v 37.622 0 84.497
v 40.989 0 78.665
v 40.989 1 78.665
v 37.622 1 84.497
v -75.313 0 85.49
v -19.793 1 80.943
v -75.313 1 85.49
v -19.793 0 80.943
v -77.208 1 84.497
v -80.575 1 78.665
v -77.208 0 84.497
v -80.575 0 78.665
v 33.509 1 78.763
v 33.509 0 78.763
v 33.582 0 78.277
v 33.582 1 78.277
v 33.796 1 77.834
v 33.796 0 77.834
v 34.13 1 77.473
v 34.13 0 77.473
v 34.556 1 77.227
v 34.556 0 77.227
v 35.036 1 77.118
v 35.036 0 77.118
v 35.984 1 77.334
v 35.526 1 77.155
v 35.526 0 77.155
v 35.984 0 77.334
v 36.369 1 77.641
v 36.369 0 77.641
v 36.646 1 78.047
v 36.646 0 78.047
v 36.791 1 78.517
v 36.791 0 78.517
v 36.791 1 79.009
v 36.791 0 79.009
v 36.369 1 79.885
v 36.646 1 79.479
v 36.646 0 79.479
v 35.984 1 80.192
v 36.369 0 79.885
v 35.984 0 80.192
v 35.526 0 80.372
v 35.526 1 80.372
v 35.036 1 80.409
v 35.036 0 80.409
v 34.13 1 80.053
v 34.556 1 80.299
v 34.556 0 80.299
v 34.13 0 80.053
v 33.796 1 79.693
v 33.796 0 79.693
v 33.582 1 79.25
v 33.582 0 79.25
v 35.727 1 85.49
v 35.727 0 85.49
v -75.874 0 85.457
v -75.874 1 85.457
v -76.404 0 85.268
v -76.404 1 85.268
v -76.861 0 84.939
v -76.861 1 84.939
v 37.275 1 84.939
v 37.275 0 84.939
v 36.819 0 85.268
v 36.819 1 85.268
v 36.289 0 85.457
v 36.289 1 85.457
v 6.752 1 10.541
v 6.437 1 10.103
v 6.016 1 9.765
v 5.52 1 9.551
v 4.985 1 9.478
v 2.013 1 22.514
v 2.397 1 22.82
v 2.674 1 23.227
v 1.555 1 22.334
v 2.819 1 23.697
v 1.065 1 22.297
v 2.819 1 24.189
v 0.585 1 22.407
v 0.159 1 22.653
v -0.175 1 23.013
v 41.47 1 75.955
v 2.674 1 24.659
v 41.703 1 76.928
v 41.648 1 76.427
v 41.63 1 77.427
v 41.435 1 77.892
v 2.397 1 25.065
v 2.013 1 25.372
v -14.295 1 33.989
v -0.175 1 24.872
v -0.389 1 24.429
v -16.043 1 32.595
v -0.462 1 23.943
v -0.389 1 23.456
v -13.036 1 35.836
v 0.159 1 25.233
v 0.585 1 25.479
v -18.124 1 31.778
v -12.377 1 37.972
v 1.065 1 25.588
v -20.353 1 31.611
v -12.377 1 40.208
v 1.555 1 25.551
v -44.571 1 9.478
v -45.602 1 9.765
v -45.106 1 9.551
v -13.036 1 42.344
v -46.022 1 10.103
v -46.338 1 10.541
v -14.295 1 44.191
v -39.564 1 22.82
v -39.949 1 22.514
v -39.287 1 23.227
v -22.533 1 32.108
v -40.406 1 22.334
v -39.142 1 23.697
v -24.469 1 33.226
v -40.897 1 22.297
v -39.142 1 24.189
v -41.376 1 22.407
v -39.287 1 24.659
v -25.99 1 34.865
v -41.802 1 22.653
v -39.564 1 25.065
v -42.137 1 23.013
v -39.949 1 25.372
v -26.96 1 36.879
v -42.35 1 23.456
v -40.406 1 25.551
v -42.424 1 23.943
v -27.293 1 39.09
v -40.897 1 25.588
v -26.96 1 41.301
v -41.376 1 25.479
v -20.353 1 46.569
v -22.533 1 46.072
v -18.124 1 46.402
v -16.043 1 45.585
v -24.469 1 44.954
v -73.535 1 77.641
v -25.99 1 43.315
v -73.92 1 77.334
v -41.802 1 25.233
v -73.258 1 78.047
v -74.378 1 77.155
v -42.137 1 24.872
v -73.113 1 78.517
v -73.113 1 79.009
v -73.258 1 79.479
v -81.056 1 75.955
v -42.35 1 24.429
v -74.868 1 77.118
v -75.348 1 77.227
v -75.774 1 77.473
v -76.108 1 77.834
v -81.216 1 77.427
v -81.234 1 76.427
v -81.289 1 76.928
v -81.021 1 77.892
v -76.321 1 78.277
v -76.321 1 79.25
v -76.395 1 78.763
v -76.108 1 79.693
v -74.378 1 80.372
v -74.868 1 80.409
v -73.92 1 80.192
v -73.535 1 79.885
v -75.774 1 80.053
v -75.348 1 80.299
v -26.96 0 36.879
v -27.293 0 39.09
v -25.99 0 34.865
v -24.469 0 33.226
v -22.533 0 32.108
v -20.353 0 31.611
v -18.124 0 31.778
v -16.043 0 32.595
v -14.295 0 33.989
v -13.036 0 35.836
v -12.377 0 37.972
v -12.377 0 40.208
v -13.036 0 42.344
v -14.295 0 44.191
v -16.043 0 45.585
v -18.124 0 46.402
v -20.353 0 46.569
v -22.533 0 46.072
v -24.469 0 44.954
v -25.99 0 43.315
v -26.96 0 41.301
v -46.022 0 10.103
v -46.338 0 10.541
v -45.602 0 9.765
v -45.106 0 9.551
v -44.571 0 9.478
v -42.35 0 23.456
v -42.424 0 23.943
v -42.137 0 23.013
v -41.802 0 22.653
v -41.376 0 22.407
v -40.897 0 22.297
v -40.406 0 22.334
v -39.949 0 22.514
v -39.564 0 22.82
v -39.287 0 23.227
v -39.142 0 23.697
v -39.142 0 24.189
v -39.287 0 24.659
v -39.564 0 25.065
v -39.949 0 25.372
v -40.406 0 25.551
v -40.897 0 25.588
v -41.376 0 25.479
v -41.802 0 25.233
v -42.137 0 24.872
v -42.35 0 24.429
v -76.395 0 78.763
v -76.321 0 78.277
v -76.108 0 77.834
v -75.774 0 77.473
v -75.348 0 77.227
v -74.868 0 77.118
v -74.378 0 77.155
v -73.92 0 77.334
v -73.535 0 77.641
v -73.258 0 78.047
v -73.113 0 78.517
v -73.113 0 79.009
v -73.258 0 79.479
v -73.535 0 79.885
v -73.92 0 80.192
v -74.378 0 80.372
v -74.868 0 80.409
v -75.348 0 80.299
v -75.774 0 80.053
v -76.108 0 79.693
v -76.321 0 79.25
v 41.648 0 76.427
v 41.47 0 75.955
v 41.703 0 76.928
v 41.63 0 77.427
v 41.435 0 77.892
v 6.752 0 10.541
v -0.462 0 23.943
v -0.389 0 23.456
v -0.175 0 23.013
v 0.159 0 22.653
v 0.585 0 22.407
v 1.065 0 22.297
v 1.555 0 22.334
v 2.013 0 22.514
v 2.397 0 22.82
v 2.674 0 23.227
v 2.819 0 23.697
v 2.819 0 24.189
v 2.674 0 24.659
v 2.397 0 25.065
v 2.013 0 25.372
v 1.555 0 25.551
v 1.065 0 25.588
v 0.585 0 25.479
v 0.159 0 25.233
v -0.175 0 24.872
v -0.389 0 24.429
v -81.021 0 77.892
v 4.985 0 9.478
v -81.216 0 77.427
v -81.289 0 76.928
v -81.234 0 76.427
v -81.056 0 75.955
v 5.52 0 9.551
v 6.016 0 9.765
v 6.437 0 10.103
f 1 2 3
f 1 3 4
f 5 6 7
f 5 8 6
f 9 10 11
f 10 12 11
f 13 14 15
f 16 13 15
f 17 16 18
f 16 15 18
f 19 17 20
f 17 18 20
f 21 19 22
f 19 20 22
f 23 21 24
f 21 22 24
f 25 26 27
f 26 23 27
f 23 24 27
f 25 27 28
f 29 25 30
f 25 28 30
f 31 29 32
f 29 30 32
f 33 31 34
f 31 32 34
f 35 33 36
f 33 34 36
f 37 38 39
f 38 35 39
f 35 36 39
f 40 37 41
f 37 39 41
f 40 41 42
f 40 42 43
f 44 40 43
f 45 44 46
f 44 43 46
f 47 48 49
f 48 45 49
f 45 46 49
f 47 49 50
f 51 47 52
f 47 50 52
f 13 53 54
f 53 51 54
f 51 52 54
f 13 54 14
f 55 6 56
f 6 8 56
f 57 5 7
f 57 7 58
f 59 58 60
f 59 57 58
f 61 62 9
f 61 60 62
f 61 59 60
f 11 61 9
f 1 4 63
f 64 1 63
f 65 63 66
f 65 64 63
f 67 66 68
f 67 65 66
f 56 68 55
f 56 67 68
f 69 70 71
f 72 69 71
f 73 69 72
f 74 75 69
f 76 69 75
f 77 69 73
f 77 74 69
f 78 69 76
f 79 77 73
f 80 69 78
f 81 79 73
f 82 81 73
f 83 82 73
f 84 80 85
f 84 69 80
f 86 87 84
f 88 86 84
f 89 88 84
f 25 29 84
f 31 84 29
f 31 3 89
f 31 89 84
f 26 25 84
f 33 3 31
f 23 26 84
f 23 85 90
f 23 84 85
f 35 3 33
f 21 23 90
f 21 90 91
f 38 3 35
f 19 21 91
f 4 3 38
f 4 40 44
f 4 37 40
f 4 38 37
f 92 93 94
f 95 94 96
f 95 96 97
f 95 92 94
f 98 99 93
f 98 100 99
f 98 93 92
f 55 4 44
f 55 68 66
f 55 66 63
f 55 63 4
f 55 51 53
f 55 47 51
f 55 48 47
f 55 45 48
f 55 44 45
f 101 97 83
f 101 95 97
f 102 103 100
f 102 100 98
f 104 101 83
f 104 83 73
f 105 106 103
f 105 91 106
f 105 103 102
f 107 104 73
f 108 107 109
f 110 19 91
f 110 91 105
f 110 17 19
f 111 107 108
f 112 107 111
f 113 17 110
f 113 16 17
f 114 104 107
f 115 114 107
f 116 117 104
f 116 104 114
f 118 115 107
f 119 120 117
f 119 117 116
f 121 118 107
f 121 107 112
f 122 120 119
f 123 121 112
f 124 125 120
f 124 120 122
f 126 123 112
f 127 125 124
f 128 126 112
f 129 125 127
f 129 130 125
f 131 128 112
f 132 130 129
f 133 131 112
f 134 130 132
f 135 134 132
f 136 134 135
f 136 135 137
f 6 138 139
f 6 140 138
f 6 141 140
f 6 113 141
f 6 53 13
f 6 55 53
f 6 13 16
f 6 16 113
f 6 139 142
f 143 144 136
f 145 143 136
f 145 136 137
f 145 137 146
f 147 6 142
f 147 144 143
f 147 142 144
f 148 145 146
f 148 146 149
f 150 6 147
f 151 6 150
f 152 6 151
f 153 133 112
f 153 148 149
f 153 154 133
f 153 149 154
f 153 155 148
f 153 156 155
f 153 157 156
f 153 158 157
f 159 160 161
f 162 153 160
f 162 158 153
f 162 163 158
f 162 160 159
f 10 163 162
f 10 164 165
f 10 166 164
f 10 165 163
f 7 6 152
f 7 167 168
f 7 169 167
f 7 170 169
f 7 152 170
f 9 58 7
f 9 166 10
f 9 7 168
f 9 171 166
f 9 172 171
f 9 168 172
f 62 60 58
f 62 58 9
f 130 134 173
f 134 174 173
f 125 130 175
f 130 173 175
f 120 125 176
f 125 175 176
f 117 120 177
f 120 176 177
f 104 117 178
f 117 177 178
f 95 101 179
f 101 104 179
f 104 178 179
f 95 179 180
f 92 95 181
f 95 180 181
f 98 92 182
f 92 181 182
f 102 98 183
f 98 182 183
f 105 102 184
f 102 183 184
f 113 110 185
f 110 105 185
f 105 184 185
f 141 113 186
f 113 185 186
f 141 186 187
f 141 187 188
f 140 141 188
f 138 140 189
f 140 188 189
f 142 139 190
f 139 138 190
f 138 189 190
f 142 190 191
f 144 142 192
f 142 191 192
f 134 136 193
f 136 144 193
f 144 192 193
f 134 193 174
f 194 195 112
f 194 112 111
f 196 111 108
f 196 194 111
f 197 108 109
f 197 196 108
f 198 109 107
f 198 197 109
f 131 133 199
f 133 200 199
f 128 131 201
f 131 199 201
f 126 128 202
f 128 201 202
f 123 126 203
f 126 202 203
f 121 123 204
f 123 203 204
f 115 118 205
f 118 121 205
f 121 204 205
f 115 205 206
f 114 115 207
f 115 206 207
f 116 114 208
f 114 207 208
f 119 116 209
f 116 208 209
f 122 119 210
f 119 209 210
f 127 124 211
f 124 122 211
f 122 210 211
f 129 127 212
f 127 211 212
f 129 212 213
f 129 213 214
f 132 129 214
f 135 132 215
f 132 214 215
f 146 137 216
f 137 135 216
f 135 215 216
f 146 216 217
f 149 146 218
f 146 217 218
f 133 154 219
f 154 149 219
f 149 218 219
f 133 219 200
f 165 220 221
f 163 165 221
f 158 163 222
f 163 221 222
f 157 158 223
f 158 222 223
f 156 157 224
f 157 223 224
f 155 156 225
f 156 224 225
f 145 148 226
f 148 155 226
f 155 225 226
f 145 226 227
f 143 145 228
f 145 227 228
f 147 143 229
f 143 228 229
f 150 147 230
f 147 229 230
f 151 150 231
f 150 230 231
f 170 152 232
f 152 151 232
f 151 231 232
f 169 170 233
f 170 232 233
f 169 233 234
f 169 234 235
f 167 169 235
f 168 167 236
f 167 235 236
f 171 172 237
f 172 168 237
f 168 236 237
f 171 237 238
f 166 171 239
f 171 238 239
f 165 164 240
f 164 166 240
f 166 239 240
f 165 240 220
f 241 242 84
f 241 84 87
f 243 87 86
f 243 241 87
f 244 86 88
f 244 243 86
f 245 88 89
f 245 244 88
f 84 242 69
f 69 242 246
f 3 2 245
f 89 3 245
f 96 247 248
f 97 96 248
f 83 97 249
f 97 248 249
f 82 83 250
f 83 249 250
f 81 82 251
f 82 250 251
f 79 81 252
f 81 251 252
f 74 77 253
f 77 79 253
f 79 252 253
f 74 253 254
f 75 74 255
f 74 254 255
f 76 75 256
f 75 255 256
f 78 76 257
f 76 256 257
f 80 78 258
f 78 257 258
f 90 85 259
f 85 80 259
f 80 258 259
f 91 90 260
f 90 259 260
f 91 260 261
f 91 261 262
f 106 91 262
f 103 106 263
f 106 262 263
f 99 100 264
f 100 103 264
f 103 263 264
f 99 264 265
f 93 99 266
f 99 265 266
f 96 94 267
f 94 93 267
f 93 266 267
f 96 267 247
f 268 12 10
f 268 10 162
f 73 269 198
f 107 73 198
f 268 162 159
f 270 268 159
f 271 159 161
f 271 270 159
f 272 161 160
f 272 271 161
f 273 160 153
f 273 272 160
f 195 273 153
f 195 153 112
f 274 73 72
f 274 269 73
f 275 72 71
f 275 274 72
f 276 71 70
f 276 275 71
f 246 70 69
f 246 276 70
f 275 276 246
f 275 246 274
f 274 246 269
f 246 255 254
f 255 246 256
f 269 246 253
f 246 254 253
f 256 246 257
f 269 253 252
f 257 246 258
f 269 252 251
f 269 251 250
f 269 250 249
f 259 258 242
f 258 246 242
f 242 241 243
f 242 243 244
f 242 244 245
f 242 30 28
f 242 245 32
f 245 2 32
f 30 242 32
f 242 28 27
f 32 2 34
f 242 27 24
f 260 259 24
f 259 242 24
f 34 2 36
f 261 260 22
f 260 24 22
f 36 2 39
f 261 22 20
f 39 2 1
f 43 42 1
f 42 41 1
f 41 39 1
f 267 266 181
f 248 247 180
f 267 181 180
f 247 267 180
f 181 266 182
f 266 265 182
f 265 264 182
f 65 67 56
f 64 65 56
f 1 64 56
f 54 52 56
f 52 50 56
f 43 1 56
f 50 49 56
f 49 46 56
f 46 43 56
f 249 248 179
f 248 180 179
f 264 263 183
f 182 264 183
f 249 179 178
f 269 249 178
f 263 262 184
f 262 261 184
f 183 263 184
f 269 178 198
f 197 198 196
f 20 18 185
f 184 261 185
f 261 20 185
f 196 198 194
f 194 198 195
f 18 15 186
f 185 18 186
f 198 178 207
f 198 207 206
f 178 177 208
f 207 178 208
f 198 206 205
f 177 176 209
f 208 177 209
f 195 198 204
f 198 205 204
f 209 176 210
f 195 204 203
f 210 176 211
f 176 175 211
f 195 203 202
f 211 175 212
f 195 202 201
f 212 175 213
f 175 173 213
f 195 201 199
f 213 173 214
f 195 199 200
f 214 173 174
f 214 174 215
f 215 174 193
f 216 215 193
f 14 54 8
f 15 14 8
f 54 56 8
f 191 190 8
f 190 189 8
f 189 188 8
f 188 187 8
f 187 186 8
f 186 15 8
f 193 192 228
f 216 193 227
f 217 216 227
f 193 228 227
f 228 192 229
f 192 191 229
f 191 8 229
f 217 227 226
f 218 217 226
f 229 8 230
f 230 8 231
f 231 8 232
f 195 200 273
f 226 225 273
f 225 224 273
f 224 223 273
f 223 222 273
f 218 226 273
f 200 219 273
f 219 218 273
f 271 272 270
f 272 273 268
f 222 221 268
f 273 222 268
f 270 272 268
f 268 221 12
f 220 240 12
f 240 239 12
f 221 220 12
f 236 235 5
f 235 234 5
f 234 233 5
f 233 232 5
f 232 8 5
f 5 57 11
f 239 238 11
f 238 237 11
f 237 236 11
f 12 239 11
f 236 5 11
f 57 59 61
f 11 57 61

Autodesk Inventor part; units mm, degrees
ref_plane "YZ Plane" through (0, 0, 0) normal (1, 0, 0) x (0, 1, 0)
ref_plane "XZ Plane" through (0, 0, 0) normal (0, 1, 0) x (-1, 0, 0)
ref_plane "XY Plane" through (0, 0, 0) normal (0, 0, 1) x (1, 0, 0)
sketch "Sketch1" plane through (0, 0, 0) normal (0, 1, 0) x (-1, 0, 0)
  line L0 (80.5749, 78.6651) -> (77.2081, 84.4966)
  line L1 (-40.9892, 78.6651) -> (-37.6223, 84.4966)
  line L2 (19.7929, 80.9426) -> (-35.727, 85.4899)
  line L3 (19.7929, 80.9426) -> (75.3128, 85.4899)
  circle A0 centre (-35.159, 78.7632) radius 1.65
  circle A1 centre (74.7448, 78.7632) radius 1.65
  circle A2 centre (-1.1879, 23.9426) radius 1.65
  circle A3 centre (40.7736, 23.9426) radius 1.65
  line L4 (-40.9892, 78.6651) -> (-41.4353, 77.8923)
  line L5 (-41.4699, 75.9547) -> (-6.7517, 10.5409)
  line L6 (-4.9851, 9.4785) -> (44.5709, 9.4785)
  line L7 (80.5749, 78.6651) -> (81.0211, 77.8923)
  line L8 (81.0556, 75.9547) -> (46.3375, 10.5409)
  arc A4 (-35.727, 85.4899) -> (-37.6223, 84.4966) centre (-35.8903, 83.4966) ccw
  arc A5 (77.2081, 84.4966) -> (75.3128, 85.4899) centre (75.476, 83.4966) ccw
  arc A6 (81.0556, 75.9547) -> (81.0211, 77.8923) centre (79.289, 76.8923) ccw
  arc A7 (44.5709, 9.4785) -> (46.3375, 10.5409) centre (44.5709, 11.4785) ccw
  arc A8 (-6.7517, 10.5409) -> (-4.9851, 9.4785) centre (-4.9851, 11.4785) ccw
  arc A9 (-41.4353, 77.8923) -> (-41.4699, 75.9547) centre (-39.7033, 76.8923) ccw
  circle A10 centre (19.7929, 39.09) radius 7.5
extrude "Extrusion1" add sketch "Sketch1" along normal blind 1
properties part number "Verboard Middle Plate" material "Veroboard"
